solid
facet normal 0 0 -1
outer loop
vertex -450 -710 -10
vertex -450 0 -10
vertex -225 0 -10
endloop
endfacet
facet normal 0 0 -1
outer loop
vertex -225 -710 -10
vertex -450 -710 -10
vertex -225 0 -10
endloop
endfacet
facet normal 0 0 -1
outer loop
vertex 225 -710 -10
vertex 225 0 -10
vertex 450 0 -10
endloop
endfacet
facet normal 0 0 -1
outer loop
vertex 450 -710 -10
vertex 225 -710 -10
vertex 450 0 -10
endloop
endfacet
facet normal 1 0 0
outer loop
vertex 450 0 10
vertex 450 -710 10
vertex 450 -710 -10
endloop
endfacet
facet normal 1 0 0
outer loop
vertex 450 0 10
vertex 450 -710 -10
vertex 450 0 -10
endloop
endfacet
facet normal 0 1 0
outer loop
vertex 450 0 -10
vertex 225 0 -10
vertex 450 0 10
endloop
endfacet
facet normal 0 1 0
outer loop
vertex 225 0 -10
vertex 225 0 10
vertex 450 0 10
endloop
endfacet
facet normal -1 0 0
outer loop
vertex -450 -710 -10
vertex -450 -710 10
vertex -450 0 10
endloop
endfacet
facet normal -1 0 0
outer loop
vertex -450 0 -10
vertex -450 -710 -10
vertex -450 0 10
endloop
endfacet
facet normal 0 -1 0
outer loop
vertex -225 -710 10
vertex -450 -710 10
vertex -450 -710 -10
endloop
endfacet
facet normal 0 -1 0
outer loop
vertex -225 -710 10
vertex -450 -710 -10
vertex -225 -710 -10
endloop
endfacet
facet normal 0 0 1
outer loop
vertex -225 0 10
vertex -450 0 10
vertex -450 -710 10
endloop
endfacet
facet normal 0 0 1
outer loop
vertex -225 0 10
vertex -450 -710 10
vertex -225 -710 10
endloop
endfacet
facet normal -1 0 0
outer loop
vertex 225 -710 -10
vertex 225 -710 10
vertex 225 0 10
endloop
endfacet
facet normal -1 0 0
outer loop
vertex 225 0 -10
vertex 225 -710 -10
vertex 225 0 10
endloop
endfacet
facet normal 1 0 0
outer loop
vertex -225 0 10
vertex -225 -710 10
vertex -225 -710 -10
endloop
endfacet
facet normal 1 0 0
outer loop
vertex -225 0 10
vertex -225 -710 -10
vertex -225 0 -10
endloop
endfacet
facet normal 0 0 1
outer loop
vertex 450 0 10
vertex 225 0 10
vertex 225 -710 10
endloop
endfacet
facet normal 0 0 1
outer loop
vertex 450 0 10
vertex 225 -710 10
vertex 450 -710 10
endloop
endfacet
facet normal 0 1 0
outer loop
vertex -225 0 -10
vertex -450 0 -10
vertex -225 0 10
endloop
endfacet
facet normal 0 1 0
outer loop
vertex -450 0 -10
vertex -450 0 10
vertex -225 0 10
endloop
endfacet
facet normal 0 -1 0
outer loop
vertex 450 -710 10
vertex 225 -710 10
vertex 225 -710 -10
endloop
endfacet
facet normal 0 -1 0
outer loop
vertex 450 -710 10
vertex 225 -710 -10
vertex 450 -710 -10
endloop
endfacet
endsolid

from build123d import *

# Parameters (mm, degrees)
SKETCH2_W             = 225
SKETCH2_H             = 710
BOSS_EXTRUDE1_DEPTH   = 10
BOSS_EXTRUDE1_2_DEPTH = 10


with BuildPart() as part:
    # Sketch2 → Boss-Extrude1 (new, symmetric)
    with BuildSketch(Plane.XY):
        with Locations((-337.5, -355)):
            Rectangle(SKETCH2_W, SKETCH2_H)
    extrude(amount=BOSS_EXTRUDE1_DEPTH, both=True)


with BuildPart() as body_2:
    # Sketch2 → Boss-Extrude1 2 (new, symmetric)
    with BuildSketch(Plane.XY):
        with Locations((337.5, -355)):
            Rectangle(SKETCH2_W, SKETCH2_H)
    extrude(amount=BOSS_EXTRUDE1_2_DEPTH, both=True)


solid = Compound([part.part, body_2.part])
